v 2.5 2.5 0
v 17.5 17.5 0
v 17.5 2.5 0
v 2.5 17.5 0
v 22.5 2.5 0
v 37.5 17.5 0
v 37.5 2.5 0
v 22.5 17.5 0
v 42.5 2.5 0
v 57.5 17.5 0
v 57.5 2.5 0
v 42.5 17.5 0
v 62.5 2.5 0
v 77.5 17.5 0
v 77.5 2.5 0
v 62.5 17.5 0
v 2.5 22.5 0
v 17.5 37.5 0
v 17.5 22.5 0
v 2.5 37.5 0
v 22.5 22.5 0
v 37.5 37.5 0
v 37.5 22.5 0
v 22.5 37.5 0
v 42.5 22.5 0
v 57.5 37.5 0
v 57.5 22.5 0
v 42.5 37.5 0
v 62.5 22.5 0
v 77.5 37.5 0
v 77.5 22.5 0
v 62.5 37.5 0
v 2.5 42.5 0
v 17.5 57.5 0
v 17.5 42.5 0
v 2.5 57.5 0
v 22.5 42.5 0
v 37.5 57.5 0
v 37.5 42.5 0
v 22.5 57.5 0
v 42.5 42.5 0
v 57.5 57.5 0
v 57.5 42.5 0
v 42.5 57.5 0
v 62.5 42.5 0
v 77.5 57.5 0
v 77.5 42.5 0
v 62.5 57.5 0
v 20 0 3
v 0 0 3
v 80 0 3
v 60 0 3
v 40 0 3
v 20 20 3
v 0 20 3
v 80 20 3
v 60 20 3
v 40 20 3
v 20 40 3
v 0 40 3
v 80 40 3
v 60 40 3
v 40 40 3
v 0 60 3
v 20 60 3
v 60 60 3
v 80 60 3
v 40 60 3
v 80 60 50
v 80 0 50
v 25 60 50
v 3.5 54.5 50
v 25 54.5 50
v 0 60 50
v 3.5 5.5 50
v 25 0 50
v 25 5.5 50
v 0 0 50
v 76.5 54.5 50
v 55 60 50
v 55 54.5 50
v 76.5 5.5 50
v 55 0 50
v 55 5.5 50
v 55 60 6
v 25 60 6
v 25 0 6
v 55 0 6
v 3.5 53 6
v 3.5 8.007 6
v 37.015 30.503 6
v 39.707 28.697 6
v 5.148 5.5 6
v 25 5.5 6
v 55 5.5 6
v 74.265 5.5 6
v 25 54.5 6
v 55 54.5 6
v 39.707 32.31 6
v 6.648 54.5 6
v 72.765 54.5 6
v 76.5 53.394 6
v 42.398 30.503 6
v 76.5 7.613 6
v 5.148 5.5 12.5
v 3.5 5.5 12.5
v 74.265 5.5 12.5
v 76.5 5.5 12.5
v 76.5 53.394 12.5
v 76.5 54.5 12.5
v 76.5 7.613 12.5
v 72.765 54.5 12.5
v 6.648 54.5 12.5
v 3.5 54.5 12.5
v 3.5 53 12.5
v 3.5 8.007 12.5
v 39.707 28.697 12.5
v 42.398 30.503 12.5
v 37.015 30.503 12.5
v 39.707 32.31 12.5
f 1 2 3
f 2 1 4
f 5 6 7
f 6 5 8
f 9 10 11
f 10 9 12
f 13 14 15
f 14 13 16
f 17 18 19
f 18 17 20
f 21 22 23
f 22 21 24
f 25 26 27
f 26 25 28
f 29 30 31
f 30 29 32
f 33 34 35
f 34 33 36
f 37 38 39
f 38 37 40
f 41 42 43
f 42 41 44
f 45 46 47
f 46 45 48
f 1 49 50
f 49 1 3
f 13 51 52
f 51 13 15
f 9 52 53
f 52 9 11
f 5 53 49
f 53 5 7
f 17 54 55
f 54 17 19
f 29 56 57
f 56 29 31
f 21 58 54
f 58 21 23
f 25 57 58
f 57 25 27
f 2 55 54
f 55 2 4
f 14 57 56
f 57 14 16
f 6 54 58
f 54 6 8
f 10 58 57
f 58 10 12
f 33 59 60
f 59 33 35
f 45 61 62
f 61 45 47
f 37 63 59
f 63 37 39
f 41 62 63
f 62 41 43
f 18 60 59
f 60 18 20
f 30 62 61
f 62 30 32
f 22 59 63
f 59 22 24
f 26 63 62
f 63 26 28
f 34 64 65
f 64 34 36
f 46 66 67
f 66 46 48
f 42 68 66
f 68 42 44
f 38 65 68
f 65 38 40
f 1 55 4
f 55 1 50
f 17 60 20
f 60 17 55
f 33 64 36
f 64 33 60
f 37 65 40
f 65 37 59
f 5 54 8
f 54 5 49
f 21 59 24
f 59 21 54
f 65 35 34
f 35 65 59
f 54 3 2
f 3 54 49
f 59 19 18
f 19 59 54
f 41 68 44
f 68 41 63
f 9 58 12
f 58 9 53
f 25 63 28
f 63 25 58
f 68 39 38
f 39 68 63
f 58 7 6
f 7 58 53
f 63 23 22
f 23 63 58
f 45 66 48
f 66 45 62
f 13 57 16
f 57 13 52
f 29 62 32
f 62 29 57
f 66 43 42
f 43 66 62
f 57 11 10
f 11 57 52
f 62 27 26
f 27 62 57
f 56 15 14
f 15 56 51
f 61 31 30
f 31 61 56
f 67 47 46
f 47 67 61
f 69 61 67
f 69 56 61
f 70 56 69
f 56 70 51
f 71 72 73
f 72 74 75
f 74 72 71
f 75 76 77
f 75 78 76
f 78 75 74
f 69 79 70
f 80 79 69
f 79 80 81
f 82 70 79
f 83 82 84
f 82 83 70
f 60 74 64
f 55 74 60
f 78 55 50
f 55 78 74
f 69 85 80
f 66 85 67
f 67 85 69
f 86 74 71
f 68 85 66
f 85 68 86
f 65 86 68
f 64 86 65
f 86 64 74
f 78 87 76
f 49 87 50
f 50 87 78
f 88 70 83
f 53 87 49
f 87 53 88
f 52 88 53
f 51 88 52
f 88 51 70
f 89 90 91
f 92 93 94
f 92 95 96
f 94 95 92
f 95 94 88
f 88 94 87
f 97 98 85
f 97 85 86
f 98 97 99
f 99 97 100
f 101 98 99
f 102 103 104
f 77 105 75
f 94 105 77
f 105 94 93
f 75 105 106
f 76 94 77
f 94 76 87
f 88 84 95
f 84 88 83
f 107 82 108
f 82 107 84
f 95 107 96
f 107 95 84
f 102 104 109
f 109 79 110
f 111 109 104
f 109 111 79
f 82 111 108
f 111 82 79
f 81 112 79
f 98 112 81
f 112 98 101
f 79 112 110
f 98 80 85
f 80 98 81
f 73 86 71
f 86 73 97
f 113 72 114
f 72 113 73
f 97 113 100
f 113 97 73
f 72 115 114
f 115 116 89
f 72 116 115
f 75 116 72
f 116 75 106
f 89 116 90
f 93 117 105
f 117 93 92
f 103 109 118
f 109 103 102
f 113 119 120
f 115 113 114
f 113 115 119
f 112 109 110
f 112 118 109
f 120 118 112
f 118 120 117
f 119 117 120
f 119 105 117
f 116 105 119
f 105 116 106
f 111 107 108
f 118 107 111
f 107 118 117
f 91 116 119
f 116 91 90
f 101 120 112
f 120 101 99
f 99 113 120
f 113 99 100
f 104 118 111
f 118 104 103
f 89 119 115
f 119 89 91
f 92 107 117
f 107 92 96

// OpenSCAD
// file: ../common.scad
BASE_TILE_SIZE=20;
BASE_WIDTH=5;
PEAK_HEIGHT=3;

function y_up() = [90, 0, 0];
function x_up() = [90, 0, 90];

function min_floor_offset(wall_width) = wall_width + PEAK_HEIGHT;
function tri_mid() = BASE_WIDTH / 2;
function triangle() = [[0, 0],[BASE_WIDTH, 0],[tri_mid(), PEAK_HEIGHT]];
function base_tile_size() = BASE_TILE_SIZE;
function peak_height() = PEAK_HEIGHT;

function isX(direction) = (direction == "x");

module grid(width, depth, direction) {
    length = isX(direction) ? width : depth;
    slot_length = isX(direction) ? depth : width;
    translate_z = isX(direction) ? -slot_length : 0;
    rot = isX(direction) ? y_up() : x_up();

    // This is the total additional slots past the initial one
    total_slots = floor(length / BASE_TILE_SIZE);

    for (i = [0 : total_slots]) {
        offset = -tri_mid() + BASE_TILE_SIZE * i;
        rotate(rot)
        translate([offset, 0, translate_z])
        linear_extrude(height = slot_length)
        polygon(points=triangle());
    }
}

module grid_slots(width, depth) {
    grid(width, depth, "y");
    grid(width, depth, "x");
}

module base_block(width, depth, height, include_grid = true) {
    difference() {
        cube([width, depth, height]);

        if (include_grid) {
            grid_slots(width, depth);
        }
    }
}
// file: ../chip_holder.scad
use <common.scad>

MAX_THUMB_WIDTH = 30;
WAY_DEEP = 100;

module generate_holder(
    tile_columns = 4,
    tile_rows = 2,
    tile_width = 33,
    tile_depth = 33,
    tile_count = 20,
    tile_height = 1.75,
    wall_width = 3,
    box_height = 69,
    box_clearence = 15.75,
    round_to_full_base = true,
    fit_to_box_height = true,
    hollow_bottom = false,
    include_grid = true
) {
    function getSize(count, tile_size) = count * (tile_size + wall_width) + wall_width;
    function roundFullBase(count, tile_size) = (round_to_full_base) ? ceil(getSize(count, tile_size) / base_tile_size()) * base_tile_size() : getSize(count, tile_size);
    function max_height() = box_height - box_clearence;

    slot_height = tile_count * tile_height;
    min_floor_offset = min_floor_offset(wall_width);
    min_height = slot_height + min_floor_offset;
    total_height = (fit_to_box_height) ? max(max_height(), min_height) : min_height;
    inside_height = (hollow_bottom) ? total_height - min_floor_offset : slot_height;
    floor_offset = (fit_to_box_height) ? max_height() - inside_height : min_floor_offset;

    total_width = roundFullBase(tile_columns, tile_width);
    total_depth = roundFullBase(tile_rows, tile_depth);

    row_width = tile_depth * tile_rows;
    col_width = tile_width * tile_columns;
    outside_walls = wall_width * 2;

    col_spread = (tile_columns > 1) ? (total_width - col_width - outside_walls) / (tile_columns - 1) : 0;
    row_spread = (tile_rows > 1) ? (total_depth - row_width - outside_walls) / (tile_rows - 1) : 0;

    function colOffset(i) = (tile_columns == 1) ?
        (total_width - tile_width) / 2 :
        wall_width + ((tile_width + col_spread) * i);
    function rowOffset(i) = (tile_rows == 1) ?
        (total_depth - tile_depth) / 2 :
        wall_width + ((tile_depth + row_spread) * i);

    module tile_slot() {
        translate([0, 0, 0])
        square([tile_width, tile_depth]);
    }

    module thumb_slot_front() {
        width = min(tile_width - (wall_width * 2), MAX_THUMB_WIDTH);
        side_offset = (tile_width - width) / 2;
        translate([side_offset, -WAY_DEEP, 0])
        square([width, WAY_DEEP]);
    }

    module thumb_slot_back() {
        width = min(tile_width - (wall_width * 2), MAX_THUMB_WIDTH);
        side_offset = (tile_width - width) / 2;
        translate([side_offset, tile_depth, 0])
        square([width, WAY_DEEP]);
    }

    module tile_hole(slot_type = "none") {
        box_bottom = floor_offset;
        translate([0, 0, box_bottom])
        linear_extrude(height = inside_height)
        union() {
            tile_slot();
            if (slot_type == "front" || slot_type == "both") {
                thumb_slot_front();
            }

            if (slot_type == "back" || slot_type == "both") {
                thumb_slot_back();
            }
        }
    }

    module tile_holes() {
        for (i = [0 : tile_rows - 1]) {
            for (j = [0 : tile_columns - 1]) {
                slot_type = (tile_rows == 1) ? "both" : (i == 0) ? "front" : (i == tile_rows - 1) ? "back" : "none";
                col_offset = colOffset(j);
                row_offset = rowOffset(i);

                translate([col_offset, row_offset, 0])
                tile_hole(slot_type = slot_type);
            }
        }
    }

    module bottom_x() {
        if (hollow_bottom) {
            for (i = [0 : tile_rows - 1]) {
                for (j = [0 : tile_columns - 1]) {
                    length = sqrt(pow(tile_width, 2) + pow(tile_depth, 2));
                    rot = acos(tile_depth / length);
                    x_height = inside_height - slot_height;
                    z_offset = min_floor_offset(wall_width);

                    col_offset = colOffset(j);
                    row_offset = rowOffset(i);

                    translate([col_offset - wall_width / 2, row_offset + wall_width / 2, z_offset])
                    rotate([0, 0, -rot])
                    cube([wall_width, length + wall_width, x_height]);

                    translate([col_offset + tile_width, row_offset - wall_width / 2, z_offset])
                    rotate([0, 0, rot])
                    cube([wall_width, length + wall_width, x_height]);
                }
            }
        }
    }

    union() {
        difference() {
            base_block(total_width, total_depth, total_height, include_grid = include_grid);
            tile_holes();
        }
        bottom_x();
    }
}
// file: common.scad
WALL_WIDTH = 3;
BOX_HEIGHT = 50;
BOX_CLEARENCE = 0;
HOLLOW_BOTTOM = true;

function wall_width() = WALL_WIDTH;
function box_height() = BOX_HEIGHT;
function box_clearence() = BOX_CLEARENCE;
function hollow_bottom() = HOLLOW_BOTTOM;
// main file
use <common.scad>
use <../chip_holder.scad>

generate_holder(
    tile_columns = 1,
    tile_rows = 1,
    tile_width = 73,
    tile_depth = 49,
    tile_count = 25,
    tile_height = 1.5,
    wall_width = wall_width(),
    box_height = box_height(),
    box_clearence = box_clearence(),
    rount_to_full_base = true,
    fit_to_box_height = true,
    hollow_bottom = hollow_bottom()
);
